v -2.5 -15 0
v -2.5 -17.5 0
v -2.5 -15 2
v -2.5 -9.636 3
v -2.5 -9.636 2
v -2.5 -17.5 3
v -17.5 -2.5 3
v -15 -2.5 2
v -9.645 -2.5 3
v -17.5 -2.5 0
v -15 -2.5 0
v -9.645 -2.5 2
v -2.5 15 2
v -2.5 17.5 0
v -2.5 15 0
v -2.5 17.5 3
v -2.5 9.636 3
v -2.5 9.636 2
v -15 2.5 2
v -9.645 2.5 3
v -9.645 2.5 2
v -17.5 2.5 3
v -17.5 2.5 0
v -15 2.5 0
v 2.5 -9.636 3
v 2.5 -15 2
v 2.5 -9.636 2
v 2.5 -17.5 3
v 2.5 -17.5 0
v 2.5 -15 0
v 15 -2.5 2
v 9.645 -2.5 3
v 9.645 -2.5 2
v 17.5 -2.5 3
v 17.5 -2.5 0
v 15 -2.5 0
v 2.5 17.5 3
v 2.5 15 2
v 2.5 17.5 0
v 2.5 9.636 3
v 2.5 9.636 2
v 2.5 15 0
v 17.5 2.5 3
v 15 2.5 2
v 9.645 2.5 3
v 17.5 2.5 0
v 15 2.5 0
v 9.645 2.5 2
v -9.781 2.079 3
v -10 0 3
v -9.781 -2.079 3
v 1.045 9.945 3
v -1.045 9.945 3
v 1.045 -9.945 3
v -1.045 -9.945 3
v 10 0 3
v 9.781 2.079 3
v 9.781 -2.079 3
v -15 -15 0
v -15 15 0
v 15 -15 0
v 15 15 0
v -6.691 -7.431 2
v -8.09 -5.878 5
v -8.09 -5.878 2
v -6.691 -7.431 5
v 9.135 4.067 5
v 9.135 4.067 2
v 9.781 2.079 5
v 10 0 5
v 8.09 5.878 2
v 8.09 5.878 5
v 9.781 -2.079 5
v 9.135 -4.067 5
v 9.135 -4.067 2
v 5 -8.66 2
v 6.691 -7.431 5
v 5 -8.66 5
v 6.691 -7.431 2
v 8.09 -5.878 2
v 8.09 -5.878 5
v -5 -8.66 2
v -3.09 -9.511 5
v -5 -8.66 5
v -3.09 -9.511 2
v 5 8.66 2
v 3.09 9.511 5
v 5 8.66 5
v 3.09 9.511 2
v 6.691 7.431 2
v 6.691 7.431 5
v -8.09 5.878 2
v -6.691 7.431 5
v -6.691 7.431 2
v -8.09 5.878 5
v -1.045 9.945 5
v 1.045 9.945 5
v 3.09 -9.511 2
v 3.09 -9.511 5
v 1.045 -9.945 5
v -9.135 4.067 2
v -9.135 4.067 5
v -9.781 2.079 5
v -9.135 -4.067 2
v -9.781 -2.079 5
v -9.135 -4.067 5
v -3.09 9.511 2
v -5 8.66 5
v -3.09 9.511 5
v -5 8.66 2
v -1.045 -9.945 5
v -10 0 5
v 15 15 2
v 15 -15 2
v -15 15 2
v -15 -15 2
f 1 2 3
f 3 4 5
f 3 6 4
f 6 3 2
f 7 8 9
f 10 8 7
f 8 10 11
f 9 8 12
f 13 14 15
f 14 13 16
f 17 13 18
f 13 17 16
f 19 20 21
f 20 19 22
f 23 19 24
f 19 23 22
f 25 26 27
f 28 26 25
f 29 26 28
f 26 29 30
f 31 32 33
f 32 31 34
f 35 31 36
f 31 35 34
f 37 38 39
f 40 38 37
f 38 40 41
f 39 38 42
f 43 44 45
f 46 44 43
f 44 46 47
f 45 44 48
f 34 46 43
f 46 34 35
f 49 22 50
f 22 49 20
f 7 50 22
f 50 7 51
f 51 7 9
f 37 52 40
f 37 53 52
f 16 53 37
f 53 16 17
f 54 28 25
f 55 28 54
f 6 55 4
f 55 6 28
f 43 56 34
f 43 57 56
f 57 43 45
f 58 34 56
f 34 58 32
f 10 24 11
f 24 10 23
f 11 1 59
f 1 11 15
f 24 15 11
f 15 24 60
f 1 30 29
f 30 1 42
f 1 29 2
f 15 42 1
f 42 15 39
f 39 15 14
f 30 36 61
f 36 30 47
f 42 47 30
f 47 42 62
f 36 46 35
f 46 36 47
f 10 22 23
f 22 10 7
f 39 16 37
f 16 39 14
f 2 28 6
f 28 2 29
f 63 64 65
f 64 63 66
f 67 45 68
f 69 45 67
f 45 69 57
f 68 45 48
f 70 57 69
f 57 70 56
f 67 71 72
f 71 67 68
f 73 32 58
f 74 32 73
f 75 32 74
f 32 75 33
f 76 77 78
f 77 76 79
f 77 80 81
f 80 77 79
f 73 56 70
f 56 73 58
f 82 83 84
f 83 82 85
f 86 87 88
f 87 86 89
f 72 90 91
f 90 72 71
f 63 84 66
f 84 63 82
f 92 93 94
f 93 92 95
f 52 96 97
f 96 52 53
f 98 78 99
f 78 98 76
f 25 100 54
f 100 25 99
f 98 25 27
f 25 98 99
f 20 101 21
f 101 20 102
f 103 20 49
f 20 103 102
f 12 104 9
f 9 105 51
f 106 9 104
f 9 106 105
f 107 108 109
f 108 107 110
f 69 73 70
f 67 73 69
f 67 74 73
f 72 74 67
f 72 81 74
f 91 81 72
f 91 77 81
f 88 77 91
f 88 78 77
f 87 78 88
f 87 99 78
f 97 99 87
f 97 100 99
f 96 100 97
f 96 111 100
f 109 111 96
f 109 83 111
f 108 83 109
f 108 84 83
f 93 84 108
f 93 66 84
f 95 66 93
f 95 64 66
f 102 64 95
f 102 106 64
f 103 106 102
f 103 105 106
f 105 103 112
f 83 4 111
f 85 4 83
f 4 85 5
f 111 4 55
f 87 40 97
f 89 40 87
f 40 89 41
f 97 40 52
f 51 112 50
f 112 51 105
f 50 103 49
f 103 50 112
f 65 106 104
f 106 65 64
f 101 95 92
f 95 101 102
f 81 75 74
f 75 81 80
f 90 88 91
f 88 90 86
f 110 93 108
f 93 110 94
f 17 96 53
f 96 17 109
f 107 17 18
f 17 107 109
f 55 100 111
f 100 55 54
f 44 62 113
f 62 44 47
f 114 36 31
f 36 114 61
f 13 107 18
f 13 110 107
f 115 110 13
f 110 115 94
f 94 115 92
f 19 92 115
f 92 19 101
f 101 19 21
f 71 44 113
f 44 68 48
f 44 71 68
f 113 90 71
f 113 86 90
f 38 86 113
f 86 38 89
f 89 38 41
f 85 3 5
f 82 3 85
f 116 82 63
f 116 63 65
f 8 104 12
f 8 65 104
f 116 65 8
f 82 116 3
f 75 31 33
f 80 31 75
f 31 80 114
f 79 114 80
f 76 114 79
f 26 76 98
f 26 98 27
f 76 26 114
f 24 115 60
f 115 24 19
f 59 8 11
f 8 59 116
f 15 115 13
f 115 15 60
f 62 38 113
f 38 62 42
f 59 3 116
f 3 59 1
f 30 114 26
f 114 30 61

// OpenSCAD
// Test piece from https://github.com/reprappro/Mendel/tree/master/Multi-material/Sample%20Parts/Simple-test


white();
red();
green();

module green()
{
	color("green")
		translate([0,0,1])
			cube([30,30,2], center=true);
}

module white()
{
		color("white")
		translate([0,0,2.5])
			cylinder(r=10,h=5,center=true, $fn=30);
}

module red()
{
    translate([0,0,1.5])
	color("red")
	difference()
    {
		cube([35,35,3], center=true);
		for(x=[-1,1])
			for(y=[-1,1])
				translate([x*20,y*20,0])
				cube([35,35,5], center=true);
    }
}
